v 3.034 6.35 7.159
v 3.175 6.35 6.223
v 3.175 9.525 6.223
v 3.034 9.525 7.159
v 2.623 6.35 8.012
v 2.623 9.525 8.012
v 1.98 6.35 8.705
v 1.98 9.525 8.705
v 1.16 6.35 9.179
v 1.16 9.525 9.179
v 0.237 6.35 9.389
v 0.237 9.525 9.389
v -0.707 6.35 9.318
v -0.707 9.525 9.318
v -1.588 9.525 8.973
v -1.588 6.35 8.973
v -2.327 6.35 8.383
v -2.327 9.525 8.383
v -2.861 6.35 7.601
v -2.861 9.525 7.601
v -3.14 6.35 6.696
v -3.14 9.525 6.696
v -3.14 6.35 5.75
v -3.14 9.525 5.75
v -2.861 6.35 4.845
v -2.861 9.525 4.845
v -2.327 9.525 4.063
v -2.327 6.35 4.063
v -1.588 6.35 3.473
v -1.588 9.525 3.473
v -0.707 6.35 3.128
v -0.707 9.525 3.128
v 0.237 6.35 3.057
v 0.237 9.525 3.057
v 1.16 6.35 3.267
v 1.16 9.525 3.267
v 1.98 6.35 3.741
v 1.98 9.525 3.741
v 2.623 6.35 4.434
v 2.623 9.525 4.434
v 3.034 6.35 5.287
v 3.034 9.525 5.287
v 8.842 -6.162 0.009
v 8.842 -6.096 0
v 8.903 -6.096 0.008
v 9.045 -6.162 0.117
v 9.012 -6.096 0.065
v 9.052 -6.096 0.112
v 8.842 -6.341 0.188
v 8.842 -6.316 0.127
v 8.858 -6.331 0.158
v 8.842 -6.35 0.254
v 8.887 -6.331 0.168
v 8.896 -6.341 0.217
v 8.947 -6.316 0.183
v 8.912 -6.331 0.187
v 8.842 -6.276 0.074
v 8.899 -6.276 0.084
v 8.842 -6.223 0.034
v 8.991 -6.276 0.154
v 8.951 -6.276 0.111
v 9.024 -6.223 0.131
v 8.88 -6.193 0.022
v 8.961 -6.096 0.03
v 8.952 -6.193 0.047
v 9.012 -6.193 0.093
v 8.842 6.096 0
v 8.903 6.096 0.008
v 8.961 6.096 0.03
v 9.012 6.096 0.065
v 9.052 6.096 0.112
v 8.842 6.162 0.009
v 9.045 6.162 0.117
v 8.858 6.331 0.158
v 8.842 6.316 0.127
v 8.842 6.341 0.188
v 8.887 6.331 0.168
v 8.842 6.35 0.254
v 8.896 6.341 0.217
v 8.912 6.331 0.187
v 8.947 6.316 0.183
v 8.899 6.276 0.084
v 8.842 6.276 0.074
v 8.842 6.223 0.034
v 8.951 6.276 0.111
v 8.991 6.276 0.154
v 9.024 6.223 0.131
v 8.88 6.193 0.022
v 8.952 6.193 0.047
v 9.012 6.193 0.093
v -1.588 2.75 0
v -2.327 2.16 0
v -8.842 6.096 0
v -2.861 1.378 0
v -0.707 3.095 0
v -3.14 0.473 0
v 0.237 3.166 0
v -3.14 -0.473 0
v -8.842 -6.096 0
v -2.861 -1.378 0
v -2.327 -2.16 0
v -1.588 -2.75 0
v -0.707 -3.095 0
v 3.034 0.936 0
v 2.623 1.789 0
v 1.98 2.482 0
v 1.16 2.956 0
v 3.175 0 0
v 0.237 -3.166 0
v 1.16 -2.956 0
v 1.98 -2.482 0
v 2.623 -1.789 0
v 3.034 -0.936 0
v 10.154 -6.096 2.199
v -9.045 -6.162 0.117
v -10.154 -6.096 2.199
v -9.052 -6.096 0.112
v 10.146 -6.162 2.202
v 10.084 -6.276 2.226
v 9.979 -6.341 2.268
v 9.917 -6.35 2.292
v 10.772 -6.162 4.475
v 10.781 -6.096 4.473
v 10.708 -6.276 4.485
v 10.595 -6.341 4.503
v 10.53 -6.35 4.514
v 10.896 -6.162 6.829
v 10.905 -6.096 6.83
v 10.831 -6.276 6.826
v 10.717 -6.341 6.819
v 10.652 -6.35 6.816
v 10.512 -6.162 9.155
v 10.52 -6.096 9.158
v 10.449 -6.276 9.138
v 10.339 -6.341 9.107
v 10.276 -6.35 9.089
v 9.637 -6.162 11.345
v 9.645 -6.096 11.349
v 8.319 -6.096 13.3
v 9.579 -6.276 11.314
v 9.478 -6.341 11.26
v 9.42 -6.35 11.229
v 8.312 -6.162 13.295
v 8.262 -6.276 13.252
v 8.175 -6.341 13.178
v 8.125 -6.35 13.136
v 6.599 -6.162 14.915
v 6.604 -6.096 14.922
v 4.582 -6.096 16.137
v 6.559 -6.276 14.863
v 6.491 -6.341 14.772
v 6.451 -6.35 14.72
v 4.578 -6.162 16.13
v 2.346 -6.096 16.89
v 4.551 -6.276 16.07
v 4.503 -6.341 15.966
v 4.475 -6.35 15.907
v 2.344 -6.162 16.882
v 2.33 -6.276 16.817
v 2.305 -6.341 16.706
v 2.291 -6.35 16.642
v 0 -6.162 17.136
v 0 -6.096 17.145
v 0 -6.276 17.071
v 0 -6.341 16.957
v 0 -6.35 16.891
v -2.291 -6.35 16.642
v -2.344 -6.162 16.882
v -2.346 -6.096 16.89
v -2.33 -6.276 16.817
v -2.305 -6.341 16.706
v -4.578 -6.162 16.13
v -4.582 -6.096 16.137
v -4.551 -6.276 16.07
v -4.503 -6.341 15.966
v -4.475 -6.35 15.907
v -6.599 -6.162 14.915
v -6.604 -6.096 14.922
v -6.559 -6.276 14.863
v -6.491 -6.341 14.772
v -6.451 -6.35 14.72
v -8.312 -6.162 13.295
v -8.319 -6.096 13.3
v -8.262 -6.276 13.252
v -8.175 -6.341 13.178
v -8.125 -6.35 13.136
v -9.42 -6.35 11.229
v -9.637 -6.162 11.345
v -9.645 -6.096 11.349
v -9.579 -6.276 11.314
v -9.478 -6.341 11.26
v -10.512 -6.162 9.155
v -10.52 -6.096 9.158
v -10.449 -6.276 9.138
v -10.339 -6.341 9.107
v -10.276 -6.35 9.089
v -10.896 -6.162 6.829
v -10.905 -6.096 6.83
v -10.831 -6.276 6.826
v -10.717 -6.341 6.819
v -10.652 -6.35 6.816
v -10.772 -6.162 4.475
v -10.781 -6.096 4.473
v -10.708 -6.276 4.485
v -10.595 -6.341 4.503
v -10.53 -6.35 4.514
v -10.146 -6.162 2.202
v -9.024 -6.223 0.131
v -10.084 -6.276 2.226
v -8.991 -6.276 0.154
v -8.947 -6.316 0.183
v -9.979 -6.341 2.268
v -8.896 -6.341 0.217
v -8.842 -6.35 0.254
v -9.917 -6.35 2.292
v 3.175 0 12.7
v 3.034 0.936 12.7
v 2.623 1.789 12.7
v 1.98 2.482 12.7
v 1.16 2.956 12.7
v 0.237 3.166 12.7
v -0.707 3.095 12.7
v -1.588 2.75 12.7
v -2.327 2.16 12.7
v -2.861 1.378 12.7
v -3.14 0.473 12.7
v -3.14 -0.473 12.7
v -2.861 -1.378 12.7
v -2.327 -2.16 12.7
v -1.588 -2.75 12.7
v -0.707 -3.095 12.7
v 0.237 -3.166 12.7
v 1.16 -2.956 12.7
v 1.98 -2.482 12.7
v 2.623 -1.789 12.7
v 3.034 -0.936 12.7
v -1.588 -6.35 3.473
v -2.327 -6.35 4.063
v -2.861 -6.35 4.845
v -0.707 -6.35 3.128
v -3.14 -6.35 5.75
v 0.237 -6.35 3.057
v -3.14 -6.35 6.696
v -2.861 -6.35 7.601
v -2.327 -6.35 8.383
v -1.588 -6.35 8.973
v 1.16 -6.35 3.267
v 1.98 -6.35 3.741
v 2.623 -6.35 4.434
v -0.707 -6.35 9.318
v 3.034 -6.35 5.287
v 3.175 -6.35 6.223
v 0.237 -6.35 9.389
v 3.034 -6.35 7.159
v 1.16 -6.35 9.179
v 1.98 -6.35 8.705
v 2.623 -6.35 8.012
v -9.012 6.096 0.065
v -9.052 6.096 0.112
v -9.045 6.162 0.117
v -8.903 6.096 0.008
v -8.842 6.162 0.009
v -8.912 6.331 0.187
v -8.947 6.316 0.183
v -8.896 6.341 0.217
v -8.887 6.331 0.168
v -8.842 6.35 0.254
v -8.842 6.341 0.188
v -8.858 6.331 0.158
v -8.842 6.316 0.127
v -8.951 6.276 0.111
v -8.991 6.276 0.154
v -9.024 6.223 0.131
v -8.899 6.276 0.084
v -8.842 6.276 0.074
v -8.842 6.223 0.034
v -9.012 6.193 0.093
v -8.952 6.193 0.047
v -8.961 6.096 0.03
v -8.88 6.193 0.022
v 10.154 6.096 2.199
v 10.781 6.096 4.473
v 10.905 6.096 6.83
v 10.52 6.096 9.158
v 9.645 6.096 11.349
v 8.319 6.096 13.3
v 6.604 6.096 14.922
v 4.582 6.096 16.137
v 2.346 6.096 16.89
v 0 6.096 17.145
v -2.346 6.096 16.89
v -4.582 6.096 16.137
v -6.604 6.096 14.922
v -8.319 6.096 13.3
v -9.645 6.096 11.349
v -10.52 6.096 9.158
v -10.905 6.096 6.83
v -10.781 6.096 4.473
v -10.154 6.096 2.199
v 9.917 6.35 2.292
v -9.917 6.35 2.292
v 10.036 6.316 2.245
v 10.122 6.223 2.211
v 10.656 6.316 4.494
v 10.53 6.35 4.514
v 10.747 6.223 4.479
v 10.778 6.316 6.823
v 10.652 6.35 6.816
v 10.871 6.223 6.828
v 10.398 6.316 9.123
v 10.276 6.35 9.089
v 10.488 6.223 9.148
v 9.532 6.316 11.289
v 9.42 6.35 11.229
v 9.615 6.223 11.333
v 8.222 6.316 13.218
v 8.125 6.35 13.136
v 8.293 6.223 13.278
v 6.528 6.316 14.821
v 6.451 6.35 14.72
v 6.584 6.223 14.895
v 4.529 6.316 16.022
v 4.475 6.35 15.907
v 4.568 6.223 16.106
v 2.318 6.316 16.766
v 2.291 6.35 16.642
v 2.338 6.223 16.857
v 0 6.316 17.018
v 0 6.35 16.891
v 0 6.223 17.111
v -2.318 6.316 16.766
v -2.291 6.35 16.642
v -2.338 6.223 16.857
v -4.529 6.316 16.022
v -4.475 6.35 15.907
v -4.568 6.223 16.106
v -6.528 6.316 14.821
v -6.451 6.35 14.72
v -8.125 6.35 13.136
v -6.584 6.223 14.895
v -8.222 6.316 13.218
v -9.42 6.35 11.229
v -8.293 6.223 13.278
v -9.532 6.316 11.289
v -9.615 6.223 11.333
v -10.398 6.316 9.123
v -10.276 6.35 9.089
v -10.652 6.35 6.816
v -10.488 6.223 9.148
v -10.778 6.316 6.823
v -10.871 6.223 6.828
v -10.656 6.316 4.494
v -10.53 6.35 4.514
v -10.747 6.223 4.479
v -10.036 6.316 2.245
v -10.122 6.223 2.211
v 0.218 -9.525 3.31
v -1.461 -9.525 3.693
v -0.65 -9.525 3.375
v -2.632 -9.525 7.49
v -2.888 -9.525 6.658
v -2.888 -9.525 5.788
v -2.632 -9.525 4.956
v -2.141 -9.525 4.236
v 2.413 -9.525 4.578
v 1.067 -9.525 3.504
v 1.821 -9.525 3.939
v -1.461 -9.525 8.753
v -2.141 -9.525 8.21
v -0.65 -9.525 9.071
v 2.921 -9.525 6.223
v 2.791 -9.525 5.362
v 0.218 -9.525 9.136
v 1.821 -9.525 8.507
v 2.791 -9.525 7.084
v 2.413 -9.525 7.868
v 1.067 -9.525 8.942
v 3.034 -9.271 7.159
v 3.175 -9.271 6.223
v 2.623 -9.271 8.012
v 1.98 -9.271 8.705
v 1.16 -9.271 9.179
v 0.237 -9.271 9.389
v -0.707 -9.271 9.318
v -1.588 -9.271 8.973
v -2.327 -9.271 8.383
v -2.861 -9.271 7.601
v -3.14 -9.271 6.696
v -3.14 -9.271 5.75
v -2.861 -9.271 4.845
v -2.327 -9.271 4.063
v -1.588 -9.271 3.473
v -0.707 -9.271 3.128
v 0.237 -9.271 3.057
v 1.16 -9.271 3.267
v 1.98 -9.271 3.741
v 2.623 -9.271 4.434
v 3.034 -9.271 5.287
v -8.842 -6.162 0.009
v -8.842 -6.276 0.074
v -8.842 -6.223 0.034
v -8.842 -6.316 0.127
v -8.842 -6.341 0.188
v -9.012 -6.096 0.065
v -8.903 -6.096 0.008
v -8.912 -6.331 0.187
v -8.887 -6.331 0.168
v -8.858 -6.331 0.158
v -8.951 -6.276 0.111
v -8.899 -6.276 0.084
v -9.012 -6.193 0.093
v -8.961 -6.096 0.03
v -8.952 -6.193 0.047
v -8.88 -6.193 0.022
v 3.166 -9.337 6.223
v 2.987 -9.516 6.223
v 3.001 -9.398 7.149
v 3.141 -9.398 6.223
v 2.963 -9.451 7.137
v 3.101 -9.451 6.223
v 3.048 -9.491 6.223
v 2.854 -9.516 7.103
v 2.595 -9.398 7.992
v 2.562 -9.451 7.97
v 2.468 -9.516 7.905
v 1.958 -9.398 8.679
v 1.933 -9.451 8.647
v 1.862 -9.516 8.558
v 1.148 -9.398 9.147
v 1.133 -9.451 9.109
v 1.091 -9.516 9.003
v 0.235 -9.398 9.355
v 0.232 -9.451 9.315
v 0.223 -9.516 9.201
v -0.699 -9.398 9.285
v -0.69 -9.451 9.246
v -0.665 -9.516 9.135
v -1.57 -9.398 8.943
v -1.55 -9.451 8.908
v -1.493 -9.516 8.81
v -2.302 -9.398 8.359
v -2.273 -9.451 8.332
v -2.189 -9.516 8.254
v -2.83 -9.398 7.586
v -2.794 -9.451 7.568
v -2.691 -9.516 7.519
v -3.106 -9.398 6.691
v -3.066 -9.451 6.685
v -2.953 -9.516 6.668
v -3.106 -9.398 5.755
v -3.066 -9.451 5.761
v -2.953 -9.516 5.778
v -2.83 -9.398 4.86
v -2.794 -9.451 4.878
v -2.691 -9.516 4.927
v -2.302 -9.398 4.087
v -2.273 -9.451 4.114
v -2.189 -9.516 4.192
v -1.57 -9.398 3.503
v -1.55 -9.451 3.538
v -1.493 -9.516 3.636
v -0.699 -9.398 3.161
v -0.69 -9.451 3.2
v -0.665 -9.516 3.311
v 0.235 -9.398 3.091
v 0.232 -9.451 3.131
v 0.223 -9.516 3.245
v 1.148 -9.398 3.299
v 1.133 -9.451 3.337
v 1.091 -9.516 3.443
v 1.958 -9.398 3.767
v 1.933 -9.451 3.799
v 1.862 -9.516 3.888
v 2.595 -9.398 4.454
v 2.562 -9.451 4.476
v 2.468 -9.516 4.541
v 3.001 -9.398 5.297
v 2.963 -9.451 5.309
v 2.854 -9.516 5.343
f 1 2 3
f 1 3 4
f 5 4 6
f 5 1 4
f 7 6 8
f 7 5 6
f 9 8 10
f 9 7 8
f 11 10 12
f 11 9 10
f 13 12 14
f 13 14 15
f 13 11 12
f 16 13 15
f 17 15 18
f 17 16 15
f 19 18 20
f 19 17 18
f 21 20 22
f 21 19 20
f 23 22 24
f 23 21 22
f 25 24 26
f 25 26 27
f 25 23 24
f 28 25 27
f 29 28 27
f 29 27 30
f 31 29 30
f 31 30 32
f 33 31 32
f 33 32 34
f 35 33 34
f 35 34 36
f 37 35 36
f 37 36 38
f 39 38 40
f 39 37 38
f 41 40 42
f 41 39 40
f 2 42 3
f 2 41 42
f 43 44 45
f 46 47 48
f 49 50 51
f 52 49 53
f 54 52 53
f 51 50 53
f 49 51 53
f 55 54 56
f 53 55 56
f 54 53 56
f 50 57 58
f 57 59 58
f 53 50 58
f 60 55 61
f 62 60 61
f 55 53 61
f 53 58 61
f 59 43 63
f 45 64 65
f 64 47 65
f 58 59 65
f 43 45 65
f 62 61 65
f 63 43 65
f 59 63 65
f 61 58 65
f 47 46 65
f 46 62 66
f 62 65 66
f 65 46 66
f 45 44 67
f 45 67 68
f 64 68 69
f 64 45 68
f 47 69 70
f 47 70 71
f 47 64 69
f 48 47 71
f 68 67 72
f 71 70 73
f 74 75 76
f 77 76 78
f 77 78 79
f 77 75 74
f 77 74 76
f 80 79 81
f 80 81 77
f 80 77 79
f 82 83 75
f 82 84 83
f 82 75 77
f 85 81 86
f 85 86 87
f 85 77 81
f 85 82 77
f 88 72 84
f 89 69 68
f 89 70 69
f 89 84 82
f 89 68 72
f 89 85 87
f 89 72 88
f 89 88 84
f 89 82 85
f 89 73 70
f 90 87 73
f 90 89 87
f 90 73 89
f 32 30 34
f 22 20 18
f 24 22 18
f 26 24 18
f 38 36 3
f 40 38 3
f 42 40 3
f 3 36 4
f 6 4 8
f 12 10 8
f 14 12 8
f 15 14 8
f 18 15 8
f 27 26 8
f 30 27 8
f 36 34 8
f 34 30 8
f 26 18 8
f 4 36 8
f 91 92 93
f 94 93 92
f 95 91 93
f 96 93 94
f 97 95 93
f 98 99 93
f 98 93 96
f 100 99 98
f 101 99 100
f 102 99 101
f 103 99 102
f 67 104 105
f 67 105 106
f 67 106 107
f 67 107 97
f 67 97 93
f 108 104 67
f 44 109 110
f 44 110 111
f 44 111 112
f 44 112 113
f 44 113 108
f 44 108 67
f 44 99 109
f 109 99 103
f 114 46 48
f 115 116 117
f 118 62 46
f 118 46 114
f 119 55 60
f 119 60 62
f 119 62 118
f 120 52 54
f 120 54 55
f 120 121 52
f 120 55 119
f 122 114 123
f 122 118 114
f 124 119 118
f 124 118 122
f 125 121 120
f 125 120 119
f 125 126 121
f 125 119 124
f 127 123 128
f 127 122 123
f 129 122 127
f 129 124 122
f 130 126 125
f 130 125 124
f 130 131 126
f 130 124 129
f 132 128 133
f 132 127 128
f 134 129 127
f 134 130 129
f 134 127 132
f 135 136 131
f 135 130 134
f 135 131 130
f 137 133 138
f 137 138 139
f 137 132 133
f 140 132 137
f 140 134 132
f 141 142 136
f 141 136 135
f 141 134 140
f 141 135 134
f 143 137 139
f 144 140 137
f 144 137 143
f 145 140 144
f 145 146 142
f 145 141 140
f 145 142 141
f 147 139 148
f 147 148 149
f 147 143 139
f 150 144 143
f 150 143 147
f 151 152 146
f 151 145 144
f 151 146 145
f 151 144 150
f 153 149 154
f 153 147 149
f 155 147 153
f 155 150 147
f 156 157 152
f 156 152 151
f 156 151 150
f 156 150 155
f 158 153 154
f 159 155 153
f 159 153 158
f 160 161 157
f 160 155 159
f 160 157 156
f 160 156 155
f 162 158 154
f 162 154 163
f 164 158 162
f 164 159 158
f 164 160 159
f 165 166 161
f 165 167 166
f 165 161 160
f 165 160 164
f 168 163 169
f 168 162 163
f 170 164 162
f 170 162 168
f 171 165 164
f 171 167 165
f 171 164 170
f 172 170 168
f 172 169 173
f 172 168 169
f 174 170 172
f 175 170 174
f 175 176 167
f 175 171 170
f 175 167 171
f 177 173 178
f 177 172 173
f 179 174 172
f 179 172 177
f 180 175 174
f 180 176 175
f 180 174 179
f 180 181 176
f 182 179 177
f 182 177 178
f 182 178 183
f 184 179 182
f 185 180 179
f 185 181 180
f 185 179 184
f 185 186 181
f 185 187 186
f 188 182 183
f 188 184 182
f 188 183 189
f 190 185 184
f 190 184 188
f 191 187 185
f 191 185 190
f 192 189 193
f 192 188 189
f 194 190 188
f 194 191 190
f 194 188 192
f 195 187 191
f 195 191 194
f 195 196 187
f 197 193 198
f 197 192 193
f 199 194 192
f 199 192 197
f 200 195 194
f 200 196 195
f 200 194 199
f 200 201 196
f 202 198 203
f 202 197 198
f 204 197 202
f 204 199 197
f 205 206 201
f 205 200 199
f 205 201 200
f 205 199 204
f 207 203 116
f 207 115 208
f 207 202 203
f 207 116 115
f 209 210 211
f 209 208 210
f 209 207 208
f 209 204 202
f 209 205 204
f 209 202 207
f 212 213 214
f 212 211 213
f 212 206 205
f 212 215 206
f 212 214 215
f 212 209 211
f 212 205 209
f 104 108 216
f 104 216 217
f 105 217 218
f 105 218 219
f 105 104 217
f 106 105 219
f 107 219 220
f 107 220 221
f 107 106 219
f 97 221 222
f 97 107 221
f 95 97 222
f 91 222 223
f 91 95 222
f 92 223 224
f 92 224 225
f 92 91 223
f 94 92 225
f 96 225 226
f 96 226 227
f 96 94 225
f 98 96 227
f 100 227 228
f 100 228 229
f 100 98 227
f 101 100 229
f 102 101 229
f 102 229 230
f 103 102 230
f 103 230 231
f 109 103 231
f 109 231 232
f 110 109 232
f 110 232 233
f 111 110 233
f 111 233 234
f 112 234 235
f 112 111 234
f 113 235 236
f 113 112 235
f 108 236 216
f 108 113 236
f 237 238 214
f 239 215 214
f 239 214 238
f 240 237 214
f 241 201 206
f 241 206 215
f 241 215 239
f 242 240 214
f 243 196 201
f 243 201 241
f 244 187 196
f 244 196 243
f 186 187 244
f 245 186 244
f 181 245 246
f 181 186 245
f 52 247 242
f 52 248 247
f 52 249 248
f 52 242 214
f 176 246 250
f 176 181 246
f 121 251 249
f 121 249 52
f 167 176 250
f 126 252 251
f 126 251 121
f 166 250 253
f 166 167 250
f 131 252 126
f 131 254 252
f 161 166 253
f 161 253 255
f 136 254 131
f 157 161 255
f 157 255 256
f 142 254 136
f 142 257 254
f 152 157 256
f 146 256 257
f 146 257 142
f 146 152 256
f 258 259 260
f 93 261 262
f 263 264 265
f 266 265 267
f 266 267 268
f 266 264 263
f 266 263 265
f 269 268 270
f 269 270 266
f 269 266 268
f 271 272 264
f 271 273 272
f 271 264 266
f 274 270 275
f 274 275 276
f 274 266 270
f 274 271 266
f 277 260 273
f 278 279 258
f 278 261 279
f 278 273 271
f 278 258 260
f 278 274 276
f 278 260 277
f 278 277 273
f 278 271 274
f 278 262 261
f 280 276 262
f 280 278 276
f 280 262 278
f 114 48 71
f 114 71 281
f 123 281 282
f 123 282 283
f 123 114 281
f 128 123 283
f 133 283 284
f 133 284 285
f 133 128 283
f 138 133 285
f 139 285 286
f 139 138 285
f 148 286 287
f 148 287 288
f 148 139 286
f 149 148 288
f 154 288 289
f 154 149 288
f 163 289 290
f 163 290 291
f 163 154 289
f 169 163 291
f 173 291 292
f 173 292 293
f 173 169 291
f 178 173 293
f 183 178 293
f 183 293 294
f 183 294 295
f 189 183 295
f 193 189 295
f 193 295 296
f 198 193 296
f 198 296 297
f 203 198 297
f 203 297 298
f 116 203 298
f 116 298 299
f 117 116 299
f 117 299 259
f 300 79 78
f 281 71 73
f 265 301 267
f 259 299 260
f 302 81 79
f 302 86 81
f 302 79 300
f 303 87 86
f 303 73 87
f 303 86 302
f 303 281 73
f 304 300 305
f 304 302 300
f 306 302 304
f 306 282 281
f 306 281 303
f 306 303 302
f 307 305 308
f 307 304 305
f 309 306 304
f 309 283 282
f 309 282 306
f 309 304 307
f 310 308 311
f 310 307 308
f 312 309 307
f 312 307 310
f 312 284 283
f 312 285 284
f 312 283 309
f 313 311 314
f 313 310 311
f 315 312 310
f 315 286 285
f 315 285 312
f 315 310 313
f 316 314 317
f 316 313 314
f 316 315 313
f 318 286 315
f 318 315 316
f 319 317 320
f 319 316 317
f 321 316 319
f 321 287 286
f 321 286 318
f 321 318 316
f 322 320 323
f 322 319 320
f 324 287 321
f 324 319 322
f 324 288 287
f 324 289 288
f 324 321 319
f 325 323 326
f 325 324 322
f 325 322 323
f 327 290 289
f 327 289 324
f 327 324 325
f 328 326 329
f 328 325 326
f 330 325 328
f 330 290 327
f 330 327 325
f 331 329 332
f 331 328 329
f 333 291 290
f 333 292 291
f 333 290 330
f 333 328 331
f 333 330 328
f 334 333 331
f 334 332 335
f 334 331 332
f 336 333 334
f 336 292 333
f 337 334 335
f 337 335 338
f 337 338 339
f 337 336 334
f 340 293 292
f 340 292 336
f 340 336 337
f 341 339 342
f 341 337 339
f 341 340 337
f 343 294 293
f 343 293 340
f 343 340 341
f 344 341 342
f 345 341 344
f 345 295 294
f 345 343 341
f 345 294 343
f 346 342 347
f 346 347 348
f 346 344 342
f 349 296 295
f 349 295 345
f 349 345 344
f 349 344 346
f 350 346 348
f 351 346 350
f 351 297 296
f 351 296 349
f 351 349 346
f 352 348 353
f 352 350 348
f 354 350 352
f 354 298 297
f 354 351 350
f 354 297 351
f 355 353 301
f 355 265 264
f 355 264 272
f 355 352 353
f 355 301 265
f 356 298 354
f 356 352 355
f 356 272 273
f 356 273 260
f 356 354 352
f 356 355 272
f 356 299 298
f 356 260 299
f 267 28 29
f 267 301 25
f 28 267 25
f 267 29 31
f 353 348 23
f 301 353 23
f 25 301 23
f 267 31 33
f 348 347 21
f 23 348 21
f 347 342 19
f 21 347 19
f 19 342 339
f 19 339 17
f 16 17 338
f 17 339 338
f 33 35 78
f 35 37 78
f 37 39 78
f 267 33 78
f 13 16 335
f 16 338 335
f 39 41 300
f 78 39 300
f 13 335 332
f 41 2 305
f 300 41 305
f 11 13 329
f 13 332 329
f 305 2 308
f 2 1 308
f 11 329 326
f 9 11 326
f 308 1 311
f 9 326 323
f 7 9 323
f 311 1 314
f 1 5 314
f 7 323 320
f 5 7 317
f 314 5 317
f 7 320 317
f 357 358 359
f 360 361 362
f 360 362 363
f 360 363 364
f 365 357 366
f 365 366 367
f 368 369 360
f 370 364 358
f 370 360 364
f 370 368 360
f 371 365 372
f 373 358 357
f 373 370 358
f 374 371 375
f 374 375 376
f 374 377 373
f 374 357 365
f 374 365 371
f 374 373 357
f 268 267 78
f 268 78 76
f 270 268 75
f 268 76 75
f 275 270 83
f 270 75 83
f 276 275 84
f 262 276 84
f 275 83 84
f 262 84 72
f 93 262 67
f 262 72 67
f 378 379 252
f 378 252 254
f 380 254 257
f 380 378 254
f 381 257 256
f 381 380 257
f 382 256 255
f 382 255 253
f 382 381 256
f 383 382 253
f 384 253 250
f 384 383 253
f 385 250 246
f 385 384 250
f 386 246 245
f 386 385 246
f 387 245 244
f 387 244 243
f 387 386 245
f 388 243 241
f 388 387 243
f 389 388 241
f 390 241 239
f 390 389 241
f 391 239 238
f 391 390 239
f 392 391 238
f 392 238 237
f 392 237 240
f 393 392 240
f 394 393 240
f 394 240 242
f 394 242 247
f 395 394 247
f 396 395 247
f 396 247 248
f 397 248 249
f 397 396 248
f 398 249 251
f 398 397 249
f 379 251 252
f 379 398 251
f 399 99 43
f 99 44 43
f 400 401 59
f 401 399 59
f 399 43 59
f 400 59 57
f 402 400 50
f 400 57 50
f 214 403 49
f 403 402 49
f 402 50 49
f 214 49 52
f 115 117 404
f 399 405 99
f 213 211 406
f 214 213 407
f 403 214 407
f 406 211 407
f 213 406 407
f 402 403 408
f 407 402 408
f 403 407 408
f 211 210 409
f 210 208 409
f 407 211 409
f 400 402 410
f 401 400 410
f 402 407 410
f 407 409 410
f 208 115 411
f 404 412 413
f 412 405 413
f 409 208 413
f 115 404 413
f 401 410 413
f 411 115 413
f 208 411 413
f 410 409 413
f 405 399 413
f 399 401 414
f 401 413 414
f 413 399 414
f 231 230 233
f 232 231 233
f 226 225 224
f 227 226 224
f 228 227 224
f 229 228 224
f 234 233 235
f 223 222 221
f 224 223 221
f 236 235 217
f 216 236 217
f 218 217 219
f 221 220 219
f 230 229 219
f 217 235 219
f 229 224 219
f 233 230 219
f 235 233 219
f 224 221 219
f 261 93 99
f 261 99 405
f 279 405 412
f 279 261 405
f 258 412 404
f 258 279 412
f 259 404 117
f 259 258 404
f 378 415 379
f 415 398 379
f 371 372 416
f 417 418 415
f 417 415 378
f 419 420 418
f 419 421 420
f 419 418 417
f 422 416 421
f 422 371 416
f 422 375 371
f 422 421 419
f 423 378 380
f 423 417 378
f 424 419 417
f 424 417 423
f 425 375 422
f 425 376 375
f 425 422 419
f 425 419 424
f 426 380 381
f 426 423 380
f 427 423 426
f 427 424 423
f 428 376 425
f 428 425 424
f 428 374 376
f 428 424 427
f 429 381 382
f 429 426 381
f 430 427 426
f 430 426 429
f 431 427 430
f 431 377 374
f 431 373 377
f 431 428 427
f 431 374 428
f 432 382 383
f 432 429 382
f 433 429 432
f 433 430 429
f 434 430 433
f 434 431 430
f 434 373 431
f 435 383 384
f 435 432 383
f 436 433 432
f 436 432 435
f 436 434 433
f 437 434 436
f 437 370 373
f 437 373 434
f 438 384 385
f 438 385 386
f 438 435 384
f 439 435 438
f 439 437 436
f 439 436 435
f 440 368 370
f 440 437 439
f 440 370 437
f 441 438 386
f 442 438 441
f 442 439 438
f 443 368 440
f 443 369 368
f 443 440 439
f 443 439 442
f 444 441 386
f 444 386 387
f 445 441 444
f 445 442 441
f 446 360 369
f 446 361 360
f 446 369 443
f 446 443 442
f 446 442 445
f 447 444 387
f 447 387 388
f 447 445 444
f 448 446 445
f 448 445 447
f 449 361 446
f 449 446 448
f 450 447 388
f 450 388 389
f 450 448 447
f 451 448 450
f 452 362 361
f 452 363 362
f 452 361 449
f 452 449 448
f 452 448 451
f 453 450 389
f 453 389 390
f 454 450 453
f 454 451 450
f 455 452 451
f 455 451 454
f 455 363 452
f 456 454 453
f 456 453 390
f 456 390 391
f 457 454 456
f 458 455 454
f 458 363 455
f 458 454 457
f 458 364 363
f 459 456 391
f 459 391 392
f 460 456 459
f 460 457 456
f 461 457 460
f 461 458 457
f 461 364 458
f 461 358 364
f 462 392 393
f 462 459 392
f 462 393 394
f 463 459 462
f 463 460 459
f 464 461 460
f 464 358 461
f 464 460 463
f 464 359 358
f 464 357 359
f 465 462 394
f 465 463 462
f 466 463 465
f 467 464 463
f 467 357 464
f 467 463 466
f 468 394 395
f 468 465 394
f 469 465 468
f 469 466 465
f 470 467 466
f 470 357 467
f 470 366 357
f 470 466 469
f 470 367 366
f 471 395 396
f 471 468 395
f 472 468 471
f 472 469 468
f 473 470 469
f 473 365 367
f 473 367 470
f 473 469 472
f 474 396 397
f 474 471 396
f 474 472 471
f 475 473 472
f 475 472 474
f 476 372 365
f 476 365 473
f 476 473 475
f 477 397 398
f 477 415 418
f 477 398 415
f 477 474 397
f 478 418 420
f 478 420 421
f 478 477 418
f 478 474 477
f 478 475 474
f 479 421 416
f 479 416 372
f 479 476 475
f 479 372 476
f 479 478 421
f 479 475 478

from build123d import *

# Parameters (mm, degrees)
F3_DEPTH = 6.35
F1_R     = 3.175
F4_DEPTH = 9.525
F2_R     = 3.175
F5_DEPTH = 12.7
F6_R     = 0.254


with BuildPart() as f3:
    # F0 (on Front) → F3 (new body, symmetric)
    with BuildSketch(Plane.XZ):
        with BuildLine():
            Line((-8.9757648699, 0), (8.9757648699, 0))
            ThreePointArc((8.9757648699, 0), (0, 17.145), (-8.9757648699, 0))
        make_face()
    extrude(amount=F3_DEPTH, both=True)

    # F1 (on Front) → F4 (join, symmetric)
    with BuildSketch(Plane.XZ):
        with Locations((0, 6.223)):
            Circle(F1_R)
    extrude(amount=F4_DEPTH, both=True)

    # F2 (on Top) → F5 (cut)
    with BuildSketch(Plane.XY):
        Circle(F2_R)
    extrude(amount=F5_DEPTH, mode=Mode.SUBTRACT)

    # F6
    f6_edges = [f3.edges().sort_by_distance(p)[0] for p in [
        (0, -6.35, 17.145),
        (0, 6.35, 17.145),
        (8.975765, 0, 0),
        (0, -6.35, 0),
        (-3.175, -9.525, 6.223),
        (0, 6.35, 0),
        (-8.975765, 0, 0),
    ]]
    fillet(f6_edges, radius=F6_R)


solid = f3.part
